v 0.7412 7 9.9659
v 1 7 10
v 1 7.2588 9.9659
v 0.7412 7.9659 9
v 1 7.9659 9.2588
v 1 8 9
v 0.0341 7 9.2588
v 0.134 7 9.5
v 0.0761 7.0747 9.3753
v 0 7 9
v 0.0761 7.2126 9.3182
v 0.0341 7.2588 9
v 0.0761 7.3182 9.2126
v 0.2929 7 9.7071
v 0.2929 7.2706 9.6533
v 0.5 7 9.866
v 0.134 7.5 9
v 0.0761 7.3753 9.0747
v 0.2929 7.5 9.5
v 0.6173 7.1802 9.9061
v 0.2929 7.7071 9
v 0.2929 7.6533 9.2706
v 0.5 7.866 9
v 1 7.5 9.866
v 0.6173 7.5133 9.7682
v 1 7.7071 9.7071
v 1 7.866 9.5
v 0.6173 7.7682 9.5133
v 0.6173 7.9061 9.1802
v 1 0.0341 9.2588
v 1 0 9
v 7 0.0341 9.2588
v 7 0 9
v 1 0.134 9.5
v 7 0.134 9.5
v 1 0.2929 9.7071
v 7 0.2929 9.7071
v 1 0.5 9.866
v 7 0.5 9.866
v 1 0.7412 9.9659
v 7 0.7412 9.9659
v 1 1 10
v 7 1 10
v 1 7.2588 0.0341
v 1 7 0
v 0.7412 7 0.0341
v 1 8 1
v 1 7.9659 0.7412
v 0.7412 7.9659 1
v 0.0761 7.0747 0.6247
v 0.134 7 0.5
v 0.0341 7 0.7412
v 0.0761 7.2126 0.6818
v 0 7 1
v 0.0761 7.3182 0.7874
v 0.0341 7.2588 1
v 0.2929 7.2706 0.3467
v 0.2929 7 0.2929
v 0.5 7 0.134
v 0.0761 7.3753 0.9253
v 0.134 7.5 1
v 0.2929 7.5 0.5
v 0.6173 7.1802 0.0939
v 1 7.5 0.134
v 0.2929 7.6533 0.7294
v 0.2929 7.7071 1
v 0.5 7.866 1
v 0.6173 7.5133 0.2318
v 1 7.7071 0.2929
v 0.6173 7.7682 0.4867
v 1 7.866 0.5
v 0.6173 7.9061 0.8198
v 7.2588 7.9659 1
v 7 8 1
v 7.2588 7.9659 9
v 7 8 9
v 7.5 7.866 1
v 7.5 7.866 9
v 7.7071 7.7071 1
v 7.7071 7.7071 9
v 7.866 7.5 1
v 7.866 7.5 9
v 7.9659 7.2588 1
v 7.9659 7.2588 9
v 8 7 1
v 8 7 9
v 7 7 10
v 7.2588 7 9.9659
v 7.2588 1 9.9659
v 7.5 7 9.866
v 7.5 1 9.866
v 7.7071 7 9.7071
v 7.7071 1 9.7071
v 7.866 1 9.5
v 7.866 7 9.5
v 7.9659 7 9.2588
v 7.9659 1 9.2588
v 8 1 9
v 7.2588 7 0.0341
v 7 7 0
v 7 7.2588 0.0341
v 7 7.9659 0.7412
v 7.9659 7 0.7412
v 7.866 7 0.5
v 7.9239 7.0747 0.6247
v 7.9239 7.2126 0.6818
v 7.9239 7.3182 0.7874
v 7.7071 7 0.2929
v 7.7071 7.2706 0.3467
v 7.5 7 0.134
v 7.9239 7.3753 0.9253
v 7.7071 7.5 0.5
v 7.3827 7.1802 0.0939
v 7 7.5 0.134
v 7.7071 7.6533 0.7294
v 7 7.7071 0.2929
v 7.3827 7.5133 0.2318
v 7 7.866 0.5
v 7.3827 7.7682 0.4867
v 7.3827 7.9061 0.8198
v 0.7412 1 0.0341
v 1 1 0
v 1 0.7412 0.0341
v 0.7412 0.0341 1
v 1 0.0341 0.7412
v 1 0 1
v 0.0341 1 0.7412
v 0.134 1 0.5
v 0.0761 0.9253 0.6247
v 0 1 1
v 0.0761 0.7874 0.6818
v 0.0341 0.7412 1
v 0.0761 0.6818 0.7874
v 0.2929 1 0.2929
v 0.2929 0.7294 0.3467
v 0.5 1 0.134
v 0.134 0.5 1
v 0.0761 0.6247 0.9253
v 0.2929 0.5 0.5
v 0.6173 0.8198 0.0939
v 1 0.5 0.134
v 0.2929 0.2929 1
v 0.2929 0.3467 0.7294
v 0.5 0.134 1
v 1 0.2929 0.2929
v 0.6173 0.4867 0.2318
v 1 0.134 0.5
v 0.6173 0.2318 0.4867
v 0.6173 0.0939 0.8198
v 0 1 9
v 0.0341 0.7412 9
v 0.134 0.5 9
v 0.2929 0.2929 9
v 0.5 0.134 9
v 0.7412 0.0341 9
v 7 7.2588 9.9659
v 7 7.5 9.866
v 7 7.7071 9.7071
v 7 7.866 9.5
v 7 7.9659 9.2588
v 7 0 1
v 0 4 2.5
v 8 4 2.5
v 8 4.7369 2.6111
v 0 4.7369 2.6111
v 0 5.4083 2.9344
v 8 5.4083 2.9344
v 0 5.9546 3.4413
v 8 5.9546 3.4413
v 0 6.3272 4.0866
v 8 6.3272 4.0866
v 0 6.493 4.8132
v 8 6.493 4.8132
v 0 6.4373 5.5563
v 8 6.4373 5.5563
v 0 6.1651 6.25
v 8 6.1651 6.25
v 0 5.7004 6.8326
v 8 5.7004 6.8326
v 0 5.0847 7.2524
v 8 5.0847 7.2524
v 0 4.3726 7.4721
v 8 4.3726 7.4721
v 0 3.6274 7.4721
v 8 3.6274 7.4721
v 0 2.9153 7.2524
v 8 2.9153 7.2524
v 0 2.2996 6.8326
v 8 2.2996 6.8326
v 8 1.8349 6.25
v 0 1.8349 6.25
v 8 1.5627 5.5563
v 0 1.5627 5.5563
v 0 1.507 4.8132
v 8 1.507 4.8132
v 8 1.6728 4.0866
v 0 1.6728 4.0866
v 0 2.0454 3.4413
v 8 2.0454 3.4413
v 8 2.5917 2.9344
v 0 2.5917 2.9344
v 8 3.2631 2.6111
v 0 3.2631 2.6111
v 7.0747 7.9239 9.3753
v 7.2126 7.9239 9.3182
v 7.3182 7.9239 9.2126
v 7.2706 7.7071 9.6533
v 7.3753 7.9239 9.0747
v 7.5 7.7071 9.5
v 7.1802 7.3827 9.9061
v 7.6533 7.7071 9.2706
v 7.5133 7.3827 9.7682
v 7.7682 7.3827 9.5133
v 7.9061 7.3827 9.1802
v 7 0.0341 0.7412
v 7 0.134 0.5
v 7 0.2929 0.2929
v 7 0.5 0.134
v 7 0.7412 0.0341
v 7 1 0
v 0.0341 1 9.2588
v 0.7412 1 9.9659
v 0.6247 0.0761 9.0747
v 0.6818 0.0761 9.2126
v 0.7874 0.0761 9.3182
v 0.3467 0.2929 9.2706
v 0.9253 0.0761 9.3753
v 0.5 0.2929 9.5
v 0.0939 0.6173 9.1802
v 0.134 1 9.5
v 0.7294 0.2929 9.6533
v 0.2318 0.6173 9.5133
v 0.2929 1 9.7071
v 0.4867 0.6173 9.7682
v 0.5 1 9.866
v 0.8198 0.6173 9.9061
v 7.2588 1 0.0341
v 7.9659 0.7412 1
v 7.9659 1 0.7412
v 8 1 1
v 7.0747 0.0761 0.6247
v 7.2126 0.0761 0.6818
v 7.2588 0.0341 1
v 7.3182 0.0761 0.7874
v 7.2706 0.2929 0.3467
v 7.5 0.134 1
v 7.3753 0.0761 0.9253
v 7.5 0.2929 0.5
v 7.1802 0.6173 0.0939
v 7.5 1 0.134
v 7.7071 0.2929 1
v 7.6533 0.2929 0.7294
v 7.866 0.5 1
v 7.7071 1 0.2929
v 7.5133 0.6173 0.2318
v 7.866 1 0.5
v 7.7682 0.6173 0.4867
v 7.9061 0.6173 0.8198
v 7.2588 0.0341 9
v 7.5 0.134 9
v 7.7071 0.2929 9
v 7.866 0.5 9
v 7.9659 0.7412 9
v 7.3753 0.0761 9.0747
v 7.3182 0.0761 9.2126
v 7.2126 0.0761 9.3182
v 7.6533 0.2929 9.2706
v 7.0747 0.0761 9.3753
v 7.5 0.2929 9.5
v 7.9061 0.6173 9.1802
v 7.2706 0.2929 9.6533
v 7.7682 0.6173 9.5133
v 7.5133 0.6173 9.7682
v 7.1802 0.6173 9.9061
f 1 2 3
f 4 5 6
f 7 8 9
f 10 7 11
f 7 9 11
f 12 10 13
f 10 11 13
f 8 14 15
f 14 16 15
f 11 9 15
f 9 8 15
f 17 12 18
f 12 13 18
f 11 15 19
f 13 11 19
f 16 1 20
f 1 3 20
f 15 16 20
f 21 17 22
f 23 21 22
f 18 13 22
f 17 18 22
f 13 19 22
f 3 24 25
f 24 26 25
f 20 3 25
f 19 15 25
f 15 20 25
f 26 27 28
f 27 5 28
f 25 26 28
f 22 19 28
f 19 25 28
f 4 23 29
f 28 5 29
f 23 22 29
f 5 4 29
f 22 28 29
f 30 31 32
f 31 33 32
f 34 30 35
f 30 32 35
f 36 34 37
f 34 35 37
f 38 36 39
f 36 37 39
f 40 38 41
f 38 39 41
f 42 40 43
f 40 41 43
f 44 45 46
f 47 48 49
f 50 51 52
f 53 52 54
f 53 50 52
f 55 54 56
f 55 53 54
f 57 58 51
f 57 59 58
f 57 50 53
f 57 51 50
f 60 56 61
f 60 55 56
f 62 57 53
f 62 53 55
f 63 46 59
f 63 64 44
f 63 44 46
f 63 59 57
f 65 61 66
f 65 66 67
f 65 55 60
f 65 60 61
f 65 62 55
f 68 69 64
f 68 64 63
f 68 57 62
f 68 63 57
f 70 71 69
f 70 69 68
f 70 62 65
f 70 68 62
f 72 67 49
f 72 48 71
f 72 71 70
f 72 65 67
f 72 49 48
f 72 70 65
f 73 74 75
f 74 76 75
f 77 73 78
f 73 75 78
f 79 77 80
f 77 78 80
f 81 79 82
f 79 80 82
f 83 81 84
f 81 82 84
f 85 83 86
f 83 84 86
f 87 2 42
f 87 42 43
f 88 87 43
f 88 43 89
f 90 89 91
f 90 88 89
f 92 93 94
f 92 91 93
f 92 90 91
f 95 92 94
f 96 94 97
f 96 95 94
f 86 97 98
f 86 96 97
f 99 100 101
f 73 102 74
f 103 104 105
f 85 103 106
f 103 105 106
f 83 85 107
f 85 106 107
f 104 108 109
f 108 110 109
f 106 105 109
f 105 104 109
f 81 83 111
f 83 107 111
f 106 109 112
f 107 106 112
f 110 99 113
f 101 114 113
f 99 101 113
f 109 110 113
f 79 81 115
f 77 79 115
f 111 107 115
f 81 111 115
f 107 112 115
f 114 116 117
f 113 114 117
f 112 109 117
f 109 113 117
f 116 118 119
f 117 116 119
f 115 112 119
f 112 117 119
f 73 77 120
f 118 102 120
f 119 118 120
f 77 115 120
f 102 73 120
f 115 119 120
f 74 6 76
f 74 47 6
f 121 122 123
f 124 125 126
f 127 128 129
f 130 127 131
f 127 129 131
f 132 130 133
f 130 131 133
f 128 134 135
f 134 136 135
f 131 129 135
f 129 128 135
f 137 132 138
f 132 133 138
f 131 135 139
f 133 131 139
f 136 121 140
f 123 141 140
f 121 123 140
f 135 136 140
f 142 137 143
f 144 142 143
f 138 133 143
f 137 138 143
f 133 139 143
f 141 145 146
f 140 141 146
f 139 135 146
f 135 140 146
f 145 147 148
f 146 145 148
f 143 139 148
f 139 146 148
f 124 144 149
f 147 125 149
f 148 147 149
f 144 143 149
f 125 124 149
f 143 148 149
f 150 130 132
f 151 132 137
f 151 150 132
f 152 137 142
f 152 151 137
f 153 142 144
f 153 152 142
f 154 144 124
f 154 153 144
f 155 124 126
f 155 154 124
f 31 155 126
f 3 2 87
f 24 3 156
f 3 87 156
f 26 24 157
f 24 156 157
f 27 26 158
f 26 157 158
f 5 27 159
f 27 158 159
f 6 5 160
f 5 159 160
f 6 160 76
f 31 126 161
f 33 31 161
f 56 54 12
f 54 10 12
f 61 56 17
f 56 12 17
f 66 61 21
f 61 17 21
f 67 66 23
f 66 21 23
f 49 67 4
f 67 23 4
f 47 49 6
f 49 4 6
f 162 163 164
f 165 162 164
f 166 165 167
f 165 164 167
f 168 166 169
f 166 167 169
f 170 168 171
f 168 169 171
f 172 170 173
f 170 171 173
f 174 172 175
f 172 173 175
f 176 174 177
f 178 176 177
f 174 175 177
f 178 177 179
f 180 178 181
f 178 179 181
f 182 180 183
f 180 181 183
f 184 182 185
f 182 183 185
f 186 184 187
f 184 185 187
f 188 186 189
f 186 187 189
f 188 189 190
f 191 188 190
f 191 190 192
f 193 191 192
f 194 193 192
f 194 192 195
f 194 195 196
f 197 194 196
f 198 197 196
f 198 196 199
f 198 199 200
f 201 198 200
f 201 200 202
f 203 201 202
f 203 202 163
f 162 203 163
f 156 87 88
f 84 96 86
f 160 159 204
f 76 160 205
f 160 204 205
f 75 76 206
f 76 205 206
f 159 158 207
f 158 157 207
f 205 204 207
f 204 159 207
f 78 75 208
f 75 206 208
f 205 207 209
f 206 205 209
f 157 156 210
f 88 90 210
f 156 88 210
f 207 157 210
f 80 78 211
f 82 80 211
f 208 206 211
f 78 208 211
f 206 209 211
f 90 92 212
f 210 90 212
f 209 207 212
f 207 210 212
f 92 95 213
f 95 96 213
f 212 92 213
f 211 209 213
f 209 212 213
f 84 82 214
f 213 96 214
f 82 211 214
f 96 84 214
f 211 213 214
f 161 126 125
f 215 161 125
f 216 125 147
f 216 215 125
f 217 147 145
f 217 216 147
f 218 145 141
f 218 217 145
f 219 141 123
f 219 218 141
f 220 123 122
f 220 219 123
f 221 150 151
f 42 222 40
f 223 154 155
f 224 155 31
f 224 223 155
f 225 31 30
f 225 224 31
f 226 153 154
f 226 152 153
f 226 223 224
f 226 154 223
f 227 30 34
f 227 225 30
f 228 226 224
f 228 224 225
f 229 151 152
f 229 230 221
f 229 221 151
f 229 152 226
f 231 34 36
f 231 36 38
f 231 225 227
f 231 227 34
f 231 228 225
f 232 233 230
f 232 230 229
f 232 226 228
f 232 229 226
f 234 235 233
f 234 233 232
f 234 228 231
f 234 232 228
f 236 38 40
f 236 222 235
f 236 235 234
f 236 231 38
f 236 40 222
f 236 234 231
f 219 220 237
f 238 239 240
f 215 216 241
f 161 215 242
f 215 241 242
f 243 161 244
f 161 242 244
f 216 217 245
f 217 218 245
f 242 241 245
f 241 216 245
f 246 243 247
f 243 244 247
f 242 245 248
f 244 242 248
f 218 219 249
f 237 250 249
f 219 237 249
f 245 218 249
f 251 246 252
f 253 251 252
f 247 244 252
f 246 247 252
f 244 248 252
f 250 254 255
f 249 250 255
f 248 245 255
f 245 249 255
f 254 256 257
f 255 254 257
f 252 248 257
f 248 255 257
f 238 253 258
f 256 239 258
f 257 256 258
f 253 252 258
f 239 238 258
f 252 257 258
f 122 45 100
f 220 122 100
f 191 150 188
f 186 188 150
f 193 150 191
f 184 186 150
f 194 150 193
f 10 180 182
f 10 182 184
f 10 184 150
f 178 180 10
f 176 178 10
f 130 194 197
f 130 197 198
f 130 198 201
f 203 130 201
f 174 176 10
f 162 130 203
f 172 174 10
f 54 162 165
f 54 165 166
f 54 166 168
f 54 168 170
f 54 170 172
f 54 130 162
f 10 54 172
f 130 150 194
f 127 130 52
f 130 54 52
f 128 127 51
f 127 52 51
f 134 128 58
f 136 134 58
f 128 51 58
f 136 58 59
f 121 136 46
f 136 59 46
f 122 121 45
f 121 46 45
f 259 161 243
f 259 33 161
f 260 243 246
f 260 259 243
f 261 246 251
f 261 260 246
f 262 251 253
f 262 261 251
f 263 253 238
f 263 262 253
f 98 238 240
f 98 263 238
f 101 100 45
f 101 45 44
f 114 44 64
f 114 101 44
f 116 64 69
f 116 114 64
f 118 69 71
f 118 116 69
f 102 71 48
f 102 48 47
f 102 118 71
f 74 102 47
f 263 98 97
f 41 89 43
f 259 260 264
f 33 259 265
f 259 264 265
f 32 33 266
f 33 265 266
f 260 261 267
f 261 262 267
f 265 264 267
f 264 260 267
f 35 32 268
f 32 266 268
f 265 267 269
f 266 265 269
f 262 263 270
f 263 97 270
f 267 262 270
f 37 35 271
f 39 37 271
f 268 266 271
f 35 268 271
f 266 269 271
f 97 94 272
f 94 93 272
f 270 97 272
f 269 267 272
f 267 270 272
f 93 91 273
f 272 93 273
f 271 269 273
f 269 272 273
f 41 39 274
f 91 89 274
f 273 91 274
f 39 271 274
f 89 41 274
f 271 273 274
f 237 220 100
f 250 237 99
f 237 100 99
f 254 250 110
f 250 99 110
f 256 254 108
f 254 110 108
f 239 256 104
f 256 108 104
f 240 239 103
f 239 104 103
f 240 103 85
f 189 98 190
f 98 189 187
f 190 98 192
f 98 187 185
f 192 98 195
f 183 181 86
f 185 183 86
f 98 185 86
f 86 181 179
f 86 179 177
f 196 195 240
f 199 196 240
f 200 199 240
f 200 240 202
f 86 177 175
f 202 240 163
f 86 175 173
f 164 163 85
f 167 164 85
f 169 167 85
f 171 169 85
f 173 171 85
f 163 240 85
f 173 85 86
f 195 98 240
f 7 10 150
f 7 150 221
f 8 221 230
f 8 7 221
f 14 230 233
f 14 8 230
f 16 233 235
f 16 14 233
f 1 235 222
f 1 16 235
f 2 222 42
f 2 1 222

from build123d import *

# Parameters (mm, degrees)
SKETCH_1_W          = 8
SKETCH_1_H          = 8
EXTRUDE_1_DEPTH     = 10
SKETCH_4_R          = 2.5
CUT_EXTRUDE_2_DEPTH = 9
FILLET_1_R          = 1


with BuildPart() as part:
    # 草图1 → 凸台-拉伸1 (new body)
    with BuildSketch(Plane.XY):
        with Locations((4, 4)):
            Rectangle(SKETCH_1_W, SKETCH_1_H)
    extrude(amount=EXTRUDE_1_DEPTH)

    # 草图4 → 切除-拉伸2 (cut, through all)
    with BuildSketch(Plane(origin=(8, 0, 0), x_dir=(0, 0, -1), z_dir=(1, 0, 0))):
        with Locations((-5, 4)):
            Circle(SKETCH_4_R)
    extrude(amount=-CUT_EXTRUDE_2_DEPTH, mode=Mode.SUBTRACT)

    # 圆角1
    fillet_1_edges = [part.edges().sort_by_distance(p)[0] for p in [
        (8, 4, 10),
        (4, 8, 10),
        (0, 4, 10),
        (4, 8, 0),
        (8, 4, 0),
        (4, 0, 0),
        (0, 4, 0),
        (0, 8, 5),
        (8, 8, 5),
        (8, 0, 5),
        (0, 0, 5),
        (4, 0, 10),
    ]]
    fillet(fillet_1_edges, radius=FILLET_1_R)


solid = part.part
